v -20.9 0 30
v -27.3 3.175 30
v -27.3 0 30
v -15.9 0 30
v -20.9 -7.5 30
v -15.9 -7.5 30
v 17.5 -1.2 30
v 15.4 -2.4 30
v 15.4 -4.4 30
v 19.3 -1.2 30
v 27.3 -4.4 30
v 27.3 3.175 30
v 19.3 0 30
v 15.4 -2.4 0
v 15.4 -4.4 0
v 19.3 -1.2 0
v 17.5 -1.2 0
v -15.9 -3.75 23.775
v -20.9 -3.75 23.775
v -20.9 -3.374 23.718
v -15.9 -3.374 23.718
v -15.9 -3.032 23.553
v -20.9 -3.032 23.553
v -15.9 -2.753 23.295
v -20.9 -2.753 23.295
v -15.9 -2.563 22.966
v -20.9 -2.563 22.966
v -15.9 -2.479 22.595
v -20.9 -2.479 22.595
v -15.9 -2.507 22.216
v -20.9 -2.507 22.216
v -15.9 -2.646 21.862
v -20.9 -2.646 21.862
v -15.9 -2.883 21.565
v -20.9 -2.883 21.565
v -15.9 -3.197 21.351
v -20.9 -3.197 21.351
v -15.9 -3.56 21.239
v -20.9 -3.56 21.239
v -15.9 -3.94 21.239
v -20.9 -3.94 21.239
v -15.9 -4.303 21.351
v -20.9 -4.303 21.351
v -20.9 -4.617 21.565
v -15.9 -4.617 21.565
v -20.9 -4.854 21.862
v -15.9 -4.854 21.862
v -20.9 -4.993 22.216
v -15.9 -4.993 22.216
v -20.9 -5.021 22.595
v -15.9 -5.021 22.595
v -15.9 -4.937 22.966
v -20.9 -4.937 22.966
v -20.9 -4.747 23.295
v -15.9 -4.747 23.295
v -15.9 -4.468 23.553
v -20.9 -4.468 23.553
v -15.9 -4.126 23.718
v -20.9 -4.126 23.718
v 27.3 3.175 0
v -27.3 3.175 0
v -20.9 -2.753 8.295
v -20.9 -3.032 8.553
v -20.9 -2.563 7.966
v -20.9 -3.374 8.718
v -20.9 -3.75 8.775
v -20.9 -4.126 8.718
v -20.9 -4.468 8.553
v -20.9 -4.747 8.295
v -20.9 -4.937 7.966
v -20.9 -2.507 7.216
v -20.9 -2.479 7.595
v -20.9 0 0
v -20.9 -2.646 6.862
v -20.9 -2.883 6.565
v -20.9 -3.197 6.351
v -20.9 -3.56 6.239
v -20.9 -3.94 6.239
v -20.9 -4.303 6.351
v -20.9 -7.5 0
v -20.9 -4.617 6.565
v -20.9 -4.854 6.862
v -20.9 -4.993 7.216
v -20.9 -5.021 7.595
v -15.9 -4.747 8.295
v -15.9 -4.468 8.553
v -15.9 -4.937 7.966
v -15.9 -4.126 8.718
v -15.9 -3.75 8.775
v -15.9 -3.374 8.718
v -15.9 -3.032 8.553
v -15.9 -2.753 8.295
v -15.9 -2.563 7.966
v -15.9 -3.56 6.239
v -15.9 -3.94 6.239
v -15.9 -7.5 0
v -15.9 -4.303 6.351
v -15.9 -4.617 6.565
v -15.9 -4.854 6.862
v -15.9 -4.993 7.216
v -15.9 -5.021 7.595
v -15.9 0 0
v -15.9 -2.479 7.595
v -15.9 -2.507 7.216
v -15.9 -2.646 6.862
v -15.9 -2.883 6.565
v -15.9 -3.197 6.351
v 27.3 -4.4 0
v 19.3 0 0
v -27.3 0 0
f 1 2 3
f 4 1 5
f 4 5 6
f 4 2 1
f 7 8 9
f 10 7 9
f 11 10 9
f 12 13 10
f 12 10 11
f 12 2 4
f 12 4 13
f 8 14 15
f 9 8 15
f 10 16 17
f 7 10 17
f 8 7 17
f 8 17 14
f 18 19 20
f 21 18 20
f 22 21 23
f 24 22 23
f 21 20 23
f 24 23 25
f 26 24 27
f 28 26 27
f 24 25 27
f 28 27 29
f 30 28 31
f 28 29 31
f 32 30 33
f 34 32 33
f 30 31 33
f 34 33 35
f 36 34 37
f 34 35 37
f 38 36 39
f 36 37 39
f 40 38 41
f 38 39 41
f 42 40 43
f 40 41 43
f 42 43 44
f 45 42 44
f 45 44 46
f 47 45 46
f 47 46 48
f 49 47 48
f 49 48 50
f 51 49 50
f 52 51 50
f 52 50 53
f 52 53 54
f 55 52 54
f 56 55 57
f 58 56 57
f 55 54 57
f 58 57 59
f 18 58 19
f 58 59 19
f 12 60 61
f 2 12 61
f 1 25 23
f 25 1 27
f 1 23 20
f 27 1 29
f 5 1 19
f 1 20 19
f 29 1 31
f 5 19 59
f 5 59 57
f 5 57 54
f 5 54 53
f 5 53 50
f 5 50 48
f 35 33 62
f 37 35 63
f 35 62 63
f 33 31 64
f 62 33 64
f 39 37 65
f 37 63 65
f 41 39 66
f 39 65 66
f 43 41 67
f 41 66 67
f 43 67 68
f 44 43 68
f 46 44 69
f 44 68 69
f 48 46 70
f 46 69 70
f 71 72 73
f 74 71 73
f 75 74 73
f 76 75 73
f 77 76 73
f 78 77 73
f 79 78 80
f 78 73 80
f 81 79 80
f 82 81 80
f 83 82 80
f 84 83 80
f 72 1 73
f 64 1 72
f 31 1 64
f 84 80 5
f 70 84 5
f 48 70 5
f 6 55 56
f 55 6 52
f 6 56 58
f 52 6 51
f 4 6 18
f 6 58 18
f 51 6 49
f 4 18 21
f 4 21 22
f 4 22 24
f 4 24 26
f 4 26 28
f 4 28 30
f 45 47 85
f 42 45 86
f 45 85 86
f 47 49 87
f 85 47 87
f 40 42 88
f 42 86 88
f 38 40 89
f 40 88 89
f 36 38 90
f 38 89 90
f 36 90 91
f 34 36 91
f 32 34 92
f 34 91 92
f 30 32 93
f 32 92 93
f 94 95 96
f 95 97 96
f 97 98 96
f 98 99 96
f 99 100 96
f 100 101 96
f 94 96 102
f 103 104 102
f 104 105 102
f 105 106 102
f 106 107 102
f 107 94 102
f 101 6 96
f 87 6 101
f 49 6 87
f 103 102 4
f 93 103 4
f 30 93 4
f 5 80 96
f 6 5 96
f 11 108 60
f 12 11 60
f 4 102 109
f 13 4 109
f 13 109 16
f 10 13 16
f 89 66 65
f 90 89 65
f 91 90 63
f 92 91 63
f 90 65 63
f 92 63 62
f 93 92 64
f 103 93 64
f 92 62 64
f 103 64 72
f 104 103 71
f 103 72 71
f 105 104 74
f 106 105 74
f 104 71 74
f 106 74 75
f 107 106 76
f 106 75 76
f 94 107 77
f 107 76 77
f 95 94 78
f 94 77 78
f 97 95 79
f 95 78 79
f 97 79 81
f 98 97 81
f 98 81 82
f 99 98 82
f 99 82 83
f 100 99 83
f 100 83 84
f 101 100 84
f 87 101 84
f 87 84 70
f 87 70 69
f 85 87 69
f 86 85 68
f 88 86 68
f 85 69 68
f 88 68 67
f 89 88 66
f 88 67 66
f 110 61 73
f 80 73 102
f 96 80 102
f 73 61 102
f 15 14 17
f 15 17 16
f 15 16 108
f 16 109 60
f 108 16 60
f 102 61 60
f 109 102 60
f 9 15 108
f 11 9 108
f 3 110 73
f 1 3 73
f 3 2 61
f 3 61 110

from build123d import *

# Parameters (mm, degrees)
BOSS_EXTRUDE1_DEPTH = 30
SKETCH2_R           = 1.275
CUT_EXTRUDE1_DEPTH  = 5


with BuildPart() as part:
    # Sketch1 → Boss-Extrude1 (new body)
    with BuildSketch(Plane.XY):
        Polygon((0, 0), (19.3, 0), (19.3, -1.2), (17.5, -1.2), (15.4, -2.4), (15.4, -4.4), (27.3, -4.4), (27.3, 3.175), (-27.3, 3.175), (-27.3, 0), (-20.9, 0), (-20.9, -7.5), (-15.9, -7.5), (-15.9, 0), align=None)
    extrude(amount=BOSS_EXTRUDE1_DEPTH)

    # Sketch2 → Cut-Extrude1 (cut)
    with BuildSketch(Plane.ZY.offset(20.9)):
        with Locations((7.5, -3.75)):
            Circle(SKETCH2_R)
        with Locations((22.5, -3.75)):
            Circle(SKETCH2_R)
    extrude(amount=-CUT_EXTRUDE1_DEPTH, mode=Mode.SUBTRACT)


solid = part.part
